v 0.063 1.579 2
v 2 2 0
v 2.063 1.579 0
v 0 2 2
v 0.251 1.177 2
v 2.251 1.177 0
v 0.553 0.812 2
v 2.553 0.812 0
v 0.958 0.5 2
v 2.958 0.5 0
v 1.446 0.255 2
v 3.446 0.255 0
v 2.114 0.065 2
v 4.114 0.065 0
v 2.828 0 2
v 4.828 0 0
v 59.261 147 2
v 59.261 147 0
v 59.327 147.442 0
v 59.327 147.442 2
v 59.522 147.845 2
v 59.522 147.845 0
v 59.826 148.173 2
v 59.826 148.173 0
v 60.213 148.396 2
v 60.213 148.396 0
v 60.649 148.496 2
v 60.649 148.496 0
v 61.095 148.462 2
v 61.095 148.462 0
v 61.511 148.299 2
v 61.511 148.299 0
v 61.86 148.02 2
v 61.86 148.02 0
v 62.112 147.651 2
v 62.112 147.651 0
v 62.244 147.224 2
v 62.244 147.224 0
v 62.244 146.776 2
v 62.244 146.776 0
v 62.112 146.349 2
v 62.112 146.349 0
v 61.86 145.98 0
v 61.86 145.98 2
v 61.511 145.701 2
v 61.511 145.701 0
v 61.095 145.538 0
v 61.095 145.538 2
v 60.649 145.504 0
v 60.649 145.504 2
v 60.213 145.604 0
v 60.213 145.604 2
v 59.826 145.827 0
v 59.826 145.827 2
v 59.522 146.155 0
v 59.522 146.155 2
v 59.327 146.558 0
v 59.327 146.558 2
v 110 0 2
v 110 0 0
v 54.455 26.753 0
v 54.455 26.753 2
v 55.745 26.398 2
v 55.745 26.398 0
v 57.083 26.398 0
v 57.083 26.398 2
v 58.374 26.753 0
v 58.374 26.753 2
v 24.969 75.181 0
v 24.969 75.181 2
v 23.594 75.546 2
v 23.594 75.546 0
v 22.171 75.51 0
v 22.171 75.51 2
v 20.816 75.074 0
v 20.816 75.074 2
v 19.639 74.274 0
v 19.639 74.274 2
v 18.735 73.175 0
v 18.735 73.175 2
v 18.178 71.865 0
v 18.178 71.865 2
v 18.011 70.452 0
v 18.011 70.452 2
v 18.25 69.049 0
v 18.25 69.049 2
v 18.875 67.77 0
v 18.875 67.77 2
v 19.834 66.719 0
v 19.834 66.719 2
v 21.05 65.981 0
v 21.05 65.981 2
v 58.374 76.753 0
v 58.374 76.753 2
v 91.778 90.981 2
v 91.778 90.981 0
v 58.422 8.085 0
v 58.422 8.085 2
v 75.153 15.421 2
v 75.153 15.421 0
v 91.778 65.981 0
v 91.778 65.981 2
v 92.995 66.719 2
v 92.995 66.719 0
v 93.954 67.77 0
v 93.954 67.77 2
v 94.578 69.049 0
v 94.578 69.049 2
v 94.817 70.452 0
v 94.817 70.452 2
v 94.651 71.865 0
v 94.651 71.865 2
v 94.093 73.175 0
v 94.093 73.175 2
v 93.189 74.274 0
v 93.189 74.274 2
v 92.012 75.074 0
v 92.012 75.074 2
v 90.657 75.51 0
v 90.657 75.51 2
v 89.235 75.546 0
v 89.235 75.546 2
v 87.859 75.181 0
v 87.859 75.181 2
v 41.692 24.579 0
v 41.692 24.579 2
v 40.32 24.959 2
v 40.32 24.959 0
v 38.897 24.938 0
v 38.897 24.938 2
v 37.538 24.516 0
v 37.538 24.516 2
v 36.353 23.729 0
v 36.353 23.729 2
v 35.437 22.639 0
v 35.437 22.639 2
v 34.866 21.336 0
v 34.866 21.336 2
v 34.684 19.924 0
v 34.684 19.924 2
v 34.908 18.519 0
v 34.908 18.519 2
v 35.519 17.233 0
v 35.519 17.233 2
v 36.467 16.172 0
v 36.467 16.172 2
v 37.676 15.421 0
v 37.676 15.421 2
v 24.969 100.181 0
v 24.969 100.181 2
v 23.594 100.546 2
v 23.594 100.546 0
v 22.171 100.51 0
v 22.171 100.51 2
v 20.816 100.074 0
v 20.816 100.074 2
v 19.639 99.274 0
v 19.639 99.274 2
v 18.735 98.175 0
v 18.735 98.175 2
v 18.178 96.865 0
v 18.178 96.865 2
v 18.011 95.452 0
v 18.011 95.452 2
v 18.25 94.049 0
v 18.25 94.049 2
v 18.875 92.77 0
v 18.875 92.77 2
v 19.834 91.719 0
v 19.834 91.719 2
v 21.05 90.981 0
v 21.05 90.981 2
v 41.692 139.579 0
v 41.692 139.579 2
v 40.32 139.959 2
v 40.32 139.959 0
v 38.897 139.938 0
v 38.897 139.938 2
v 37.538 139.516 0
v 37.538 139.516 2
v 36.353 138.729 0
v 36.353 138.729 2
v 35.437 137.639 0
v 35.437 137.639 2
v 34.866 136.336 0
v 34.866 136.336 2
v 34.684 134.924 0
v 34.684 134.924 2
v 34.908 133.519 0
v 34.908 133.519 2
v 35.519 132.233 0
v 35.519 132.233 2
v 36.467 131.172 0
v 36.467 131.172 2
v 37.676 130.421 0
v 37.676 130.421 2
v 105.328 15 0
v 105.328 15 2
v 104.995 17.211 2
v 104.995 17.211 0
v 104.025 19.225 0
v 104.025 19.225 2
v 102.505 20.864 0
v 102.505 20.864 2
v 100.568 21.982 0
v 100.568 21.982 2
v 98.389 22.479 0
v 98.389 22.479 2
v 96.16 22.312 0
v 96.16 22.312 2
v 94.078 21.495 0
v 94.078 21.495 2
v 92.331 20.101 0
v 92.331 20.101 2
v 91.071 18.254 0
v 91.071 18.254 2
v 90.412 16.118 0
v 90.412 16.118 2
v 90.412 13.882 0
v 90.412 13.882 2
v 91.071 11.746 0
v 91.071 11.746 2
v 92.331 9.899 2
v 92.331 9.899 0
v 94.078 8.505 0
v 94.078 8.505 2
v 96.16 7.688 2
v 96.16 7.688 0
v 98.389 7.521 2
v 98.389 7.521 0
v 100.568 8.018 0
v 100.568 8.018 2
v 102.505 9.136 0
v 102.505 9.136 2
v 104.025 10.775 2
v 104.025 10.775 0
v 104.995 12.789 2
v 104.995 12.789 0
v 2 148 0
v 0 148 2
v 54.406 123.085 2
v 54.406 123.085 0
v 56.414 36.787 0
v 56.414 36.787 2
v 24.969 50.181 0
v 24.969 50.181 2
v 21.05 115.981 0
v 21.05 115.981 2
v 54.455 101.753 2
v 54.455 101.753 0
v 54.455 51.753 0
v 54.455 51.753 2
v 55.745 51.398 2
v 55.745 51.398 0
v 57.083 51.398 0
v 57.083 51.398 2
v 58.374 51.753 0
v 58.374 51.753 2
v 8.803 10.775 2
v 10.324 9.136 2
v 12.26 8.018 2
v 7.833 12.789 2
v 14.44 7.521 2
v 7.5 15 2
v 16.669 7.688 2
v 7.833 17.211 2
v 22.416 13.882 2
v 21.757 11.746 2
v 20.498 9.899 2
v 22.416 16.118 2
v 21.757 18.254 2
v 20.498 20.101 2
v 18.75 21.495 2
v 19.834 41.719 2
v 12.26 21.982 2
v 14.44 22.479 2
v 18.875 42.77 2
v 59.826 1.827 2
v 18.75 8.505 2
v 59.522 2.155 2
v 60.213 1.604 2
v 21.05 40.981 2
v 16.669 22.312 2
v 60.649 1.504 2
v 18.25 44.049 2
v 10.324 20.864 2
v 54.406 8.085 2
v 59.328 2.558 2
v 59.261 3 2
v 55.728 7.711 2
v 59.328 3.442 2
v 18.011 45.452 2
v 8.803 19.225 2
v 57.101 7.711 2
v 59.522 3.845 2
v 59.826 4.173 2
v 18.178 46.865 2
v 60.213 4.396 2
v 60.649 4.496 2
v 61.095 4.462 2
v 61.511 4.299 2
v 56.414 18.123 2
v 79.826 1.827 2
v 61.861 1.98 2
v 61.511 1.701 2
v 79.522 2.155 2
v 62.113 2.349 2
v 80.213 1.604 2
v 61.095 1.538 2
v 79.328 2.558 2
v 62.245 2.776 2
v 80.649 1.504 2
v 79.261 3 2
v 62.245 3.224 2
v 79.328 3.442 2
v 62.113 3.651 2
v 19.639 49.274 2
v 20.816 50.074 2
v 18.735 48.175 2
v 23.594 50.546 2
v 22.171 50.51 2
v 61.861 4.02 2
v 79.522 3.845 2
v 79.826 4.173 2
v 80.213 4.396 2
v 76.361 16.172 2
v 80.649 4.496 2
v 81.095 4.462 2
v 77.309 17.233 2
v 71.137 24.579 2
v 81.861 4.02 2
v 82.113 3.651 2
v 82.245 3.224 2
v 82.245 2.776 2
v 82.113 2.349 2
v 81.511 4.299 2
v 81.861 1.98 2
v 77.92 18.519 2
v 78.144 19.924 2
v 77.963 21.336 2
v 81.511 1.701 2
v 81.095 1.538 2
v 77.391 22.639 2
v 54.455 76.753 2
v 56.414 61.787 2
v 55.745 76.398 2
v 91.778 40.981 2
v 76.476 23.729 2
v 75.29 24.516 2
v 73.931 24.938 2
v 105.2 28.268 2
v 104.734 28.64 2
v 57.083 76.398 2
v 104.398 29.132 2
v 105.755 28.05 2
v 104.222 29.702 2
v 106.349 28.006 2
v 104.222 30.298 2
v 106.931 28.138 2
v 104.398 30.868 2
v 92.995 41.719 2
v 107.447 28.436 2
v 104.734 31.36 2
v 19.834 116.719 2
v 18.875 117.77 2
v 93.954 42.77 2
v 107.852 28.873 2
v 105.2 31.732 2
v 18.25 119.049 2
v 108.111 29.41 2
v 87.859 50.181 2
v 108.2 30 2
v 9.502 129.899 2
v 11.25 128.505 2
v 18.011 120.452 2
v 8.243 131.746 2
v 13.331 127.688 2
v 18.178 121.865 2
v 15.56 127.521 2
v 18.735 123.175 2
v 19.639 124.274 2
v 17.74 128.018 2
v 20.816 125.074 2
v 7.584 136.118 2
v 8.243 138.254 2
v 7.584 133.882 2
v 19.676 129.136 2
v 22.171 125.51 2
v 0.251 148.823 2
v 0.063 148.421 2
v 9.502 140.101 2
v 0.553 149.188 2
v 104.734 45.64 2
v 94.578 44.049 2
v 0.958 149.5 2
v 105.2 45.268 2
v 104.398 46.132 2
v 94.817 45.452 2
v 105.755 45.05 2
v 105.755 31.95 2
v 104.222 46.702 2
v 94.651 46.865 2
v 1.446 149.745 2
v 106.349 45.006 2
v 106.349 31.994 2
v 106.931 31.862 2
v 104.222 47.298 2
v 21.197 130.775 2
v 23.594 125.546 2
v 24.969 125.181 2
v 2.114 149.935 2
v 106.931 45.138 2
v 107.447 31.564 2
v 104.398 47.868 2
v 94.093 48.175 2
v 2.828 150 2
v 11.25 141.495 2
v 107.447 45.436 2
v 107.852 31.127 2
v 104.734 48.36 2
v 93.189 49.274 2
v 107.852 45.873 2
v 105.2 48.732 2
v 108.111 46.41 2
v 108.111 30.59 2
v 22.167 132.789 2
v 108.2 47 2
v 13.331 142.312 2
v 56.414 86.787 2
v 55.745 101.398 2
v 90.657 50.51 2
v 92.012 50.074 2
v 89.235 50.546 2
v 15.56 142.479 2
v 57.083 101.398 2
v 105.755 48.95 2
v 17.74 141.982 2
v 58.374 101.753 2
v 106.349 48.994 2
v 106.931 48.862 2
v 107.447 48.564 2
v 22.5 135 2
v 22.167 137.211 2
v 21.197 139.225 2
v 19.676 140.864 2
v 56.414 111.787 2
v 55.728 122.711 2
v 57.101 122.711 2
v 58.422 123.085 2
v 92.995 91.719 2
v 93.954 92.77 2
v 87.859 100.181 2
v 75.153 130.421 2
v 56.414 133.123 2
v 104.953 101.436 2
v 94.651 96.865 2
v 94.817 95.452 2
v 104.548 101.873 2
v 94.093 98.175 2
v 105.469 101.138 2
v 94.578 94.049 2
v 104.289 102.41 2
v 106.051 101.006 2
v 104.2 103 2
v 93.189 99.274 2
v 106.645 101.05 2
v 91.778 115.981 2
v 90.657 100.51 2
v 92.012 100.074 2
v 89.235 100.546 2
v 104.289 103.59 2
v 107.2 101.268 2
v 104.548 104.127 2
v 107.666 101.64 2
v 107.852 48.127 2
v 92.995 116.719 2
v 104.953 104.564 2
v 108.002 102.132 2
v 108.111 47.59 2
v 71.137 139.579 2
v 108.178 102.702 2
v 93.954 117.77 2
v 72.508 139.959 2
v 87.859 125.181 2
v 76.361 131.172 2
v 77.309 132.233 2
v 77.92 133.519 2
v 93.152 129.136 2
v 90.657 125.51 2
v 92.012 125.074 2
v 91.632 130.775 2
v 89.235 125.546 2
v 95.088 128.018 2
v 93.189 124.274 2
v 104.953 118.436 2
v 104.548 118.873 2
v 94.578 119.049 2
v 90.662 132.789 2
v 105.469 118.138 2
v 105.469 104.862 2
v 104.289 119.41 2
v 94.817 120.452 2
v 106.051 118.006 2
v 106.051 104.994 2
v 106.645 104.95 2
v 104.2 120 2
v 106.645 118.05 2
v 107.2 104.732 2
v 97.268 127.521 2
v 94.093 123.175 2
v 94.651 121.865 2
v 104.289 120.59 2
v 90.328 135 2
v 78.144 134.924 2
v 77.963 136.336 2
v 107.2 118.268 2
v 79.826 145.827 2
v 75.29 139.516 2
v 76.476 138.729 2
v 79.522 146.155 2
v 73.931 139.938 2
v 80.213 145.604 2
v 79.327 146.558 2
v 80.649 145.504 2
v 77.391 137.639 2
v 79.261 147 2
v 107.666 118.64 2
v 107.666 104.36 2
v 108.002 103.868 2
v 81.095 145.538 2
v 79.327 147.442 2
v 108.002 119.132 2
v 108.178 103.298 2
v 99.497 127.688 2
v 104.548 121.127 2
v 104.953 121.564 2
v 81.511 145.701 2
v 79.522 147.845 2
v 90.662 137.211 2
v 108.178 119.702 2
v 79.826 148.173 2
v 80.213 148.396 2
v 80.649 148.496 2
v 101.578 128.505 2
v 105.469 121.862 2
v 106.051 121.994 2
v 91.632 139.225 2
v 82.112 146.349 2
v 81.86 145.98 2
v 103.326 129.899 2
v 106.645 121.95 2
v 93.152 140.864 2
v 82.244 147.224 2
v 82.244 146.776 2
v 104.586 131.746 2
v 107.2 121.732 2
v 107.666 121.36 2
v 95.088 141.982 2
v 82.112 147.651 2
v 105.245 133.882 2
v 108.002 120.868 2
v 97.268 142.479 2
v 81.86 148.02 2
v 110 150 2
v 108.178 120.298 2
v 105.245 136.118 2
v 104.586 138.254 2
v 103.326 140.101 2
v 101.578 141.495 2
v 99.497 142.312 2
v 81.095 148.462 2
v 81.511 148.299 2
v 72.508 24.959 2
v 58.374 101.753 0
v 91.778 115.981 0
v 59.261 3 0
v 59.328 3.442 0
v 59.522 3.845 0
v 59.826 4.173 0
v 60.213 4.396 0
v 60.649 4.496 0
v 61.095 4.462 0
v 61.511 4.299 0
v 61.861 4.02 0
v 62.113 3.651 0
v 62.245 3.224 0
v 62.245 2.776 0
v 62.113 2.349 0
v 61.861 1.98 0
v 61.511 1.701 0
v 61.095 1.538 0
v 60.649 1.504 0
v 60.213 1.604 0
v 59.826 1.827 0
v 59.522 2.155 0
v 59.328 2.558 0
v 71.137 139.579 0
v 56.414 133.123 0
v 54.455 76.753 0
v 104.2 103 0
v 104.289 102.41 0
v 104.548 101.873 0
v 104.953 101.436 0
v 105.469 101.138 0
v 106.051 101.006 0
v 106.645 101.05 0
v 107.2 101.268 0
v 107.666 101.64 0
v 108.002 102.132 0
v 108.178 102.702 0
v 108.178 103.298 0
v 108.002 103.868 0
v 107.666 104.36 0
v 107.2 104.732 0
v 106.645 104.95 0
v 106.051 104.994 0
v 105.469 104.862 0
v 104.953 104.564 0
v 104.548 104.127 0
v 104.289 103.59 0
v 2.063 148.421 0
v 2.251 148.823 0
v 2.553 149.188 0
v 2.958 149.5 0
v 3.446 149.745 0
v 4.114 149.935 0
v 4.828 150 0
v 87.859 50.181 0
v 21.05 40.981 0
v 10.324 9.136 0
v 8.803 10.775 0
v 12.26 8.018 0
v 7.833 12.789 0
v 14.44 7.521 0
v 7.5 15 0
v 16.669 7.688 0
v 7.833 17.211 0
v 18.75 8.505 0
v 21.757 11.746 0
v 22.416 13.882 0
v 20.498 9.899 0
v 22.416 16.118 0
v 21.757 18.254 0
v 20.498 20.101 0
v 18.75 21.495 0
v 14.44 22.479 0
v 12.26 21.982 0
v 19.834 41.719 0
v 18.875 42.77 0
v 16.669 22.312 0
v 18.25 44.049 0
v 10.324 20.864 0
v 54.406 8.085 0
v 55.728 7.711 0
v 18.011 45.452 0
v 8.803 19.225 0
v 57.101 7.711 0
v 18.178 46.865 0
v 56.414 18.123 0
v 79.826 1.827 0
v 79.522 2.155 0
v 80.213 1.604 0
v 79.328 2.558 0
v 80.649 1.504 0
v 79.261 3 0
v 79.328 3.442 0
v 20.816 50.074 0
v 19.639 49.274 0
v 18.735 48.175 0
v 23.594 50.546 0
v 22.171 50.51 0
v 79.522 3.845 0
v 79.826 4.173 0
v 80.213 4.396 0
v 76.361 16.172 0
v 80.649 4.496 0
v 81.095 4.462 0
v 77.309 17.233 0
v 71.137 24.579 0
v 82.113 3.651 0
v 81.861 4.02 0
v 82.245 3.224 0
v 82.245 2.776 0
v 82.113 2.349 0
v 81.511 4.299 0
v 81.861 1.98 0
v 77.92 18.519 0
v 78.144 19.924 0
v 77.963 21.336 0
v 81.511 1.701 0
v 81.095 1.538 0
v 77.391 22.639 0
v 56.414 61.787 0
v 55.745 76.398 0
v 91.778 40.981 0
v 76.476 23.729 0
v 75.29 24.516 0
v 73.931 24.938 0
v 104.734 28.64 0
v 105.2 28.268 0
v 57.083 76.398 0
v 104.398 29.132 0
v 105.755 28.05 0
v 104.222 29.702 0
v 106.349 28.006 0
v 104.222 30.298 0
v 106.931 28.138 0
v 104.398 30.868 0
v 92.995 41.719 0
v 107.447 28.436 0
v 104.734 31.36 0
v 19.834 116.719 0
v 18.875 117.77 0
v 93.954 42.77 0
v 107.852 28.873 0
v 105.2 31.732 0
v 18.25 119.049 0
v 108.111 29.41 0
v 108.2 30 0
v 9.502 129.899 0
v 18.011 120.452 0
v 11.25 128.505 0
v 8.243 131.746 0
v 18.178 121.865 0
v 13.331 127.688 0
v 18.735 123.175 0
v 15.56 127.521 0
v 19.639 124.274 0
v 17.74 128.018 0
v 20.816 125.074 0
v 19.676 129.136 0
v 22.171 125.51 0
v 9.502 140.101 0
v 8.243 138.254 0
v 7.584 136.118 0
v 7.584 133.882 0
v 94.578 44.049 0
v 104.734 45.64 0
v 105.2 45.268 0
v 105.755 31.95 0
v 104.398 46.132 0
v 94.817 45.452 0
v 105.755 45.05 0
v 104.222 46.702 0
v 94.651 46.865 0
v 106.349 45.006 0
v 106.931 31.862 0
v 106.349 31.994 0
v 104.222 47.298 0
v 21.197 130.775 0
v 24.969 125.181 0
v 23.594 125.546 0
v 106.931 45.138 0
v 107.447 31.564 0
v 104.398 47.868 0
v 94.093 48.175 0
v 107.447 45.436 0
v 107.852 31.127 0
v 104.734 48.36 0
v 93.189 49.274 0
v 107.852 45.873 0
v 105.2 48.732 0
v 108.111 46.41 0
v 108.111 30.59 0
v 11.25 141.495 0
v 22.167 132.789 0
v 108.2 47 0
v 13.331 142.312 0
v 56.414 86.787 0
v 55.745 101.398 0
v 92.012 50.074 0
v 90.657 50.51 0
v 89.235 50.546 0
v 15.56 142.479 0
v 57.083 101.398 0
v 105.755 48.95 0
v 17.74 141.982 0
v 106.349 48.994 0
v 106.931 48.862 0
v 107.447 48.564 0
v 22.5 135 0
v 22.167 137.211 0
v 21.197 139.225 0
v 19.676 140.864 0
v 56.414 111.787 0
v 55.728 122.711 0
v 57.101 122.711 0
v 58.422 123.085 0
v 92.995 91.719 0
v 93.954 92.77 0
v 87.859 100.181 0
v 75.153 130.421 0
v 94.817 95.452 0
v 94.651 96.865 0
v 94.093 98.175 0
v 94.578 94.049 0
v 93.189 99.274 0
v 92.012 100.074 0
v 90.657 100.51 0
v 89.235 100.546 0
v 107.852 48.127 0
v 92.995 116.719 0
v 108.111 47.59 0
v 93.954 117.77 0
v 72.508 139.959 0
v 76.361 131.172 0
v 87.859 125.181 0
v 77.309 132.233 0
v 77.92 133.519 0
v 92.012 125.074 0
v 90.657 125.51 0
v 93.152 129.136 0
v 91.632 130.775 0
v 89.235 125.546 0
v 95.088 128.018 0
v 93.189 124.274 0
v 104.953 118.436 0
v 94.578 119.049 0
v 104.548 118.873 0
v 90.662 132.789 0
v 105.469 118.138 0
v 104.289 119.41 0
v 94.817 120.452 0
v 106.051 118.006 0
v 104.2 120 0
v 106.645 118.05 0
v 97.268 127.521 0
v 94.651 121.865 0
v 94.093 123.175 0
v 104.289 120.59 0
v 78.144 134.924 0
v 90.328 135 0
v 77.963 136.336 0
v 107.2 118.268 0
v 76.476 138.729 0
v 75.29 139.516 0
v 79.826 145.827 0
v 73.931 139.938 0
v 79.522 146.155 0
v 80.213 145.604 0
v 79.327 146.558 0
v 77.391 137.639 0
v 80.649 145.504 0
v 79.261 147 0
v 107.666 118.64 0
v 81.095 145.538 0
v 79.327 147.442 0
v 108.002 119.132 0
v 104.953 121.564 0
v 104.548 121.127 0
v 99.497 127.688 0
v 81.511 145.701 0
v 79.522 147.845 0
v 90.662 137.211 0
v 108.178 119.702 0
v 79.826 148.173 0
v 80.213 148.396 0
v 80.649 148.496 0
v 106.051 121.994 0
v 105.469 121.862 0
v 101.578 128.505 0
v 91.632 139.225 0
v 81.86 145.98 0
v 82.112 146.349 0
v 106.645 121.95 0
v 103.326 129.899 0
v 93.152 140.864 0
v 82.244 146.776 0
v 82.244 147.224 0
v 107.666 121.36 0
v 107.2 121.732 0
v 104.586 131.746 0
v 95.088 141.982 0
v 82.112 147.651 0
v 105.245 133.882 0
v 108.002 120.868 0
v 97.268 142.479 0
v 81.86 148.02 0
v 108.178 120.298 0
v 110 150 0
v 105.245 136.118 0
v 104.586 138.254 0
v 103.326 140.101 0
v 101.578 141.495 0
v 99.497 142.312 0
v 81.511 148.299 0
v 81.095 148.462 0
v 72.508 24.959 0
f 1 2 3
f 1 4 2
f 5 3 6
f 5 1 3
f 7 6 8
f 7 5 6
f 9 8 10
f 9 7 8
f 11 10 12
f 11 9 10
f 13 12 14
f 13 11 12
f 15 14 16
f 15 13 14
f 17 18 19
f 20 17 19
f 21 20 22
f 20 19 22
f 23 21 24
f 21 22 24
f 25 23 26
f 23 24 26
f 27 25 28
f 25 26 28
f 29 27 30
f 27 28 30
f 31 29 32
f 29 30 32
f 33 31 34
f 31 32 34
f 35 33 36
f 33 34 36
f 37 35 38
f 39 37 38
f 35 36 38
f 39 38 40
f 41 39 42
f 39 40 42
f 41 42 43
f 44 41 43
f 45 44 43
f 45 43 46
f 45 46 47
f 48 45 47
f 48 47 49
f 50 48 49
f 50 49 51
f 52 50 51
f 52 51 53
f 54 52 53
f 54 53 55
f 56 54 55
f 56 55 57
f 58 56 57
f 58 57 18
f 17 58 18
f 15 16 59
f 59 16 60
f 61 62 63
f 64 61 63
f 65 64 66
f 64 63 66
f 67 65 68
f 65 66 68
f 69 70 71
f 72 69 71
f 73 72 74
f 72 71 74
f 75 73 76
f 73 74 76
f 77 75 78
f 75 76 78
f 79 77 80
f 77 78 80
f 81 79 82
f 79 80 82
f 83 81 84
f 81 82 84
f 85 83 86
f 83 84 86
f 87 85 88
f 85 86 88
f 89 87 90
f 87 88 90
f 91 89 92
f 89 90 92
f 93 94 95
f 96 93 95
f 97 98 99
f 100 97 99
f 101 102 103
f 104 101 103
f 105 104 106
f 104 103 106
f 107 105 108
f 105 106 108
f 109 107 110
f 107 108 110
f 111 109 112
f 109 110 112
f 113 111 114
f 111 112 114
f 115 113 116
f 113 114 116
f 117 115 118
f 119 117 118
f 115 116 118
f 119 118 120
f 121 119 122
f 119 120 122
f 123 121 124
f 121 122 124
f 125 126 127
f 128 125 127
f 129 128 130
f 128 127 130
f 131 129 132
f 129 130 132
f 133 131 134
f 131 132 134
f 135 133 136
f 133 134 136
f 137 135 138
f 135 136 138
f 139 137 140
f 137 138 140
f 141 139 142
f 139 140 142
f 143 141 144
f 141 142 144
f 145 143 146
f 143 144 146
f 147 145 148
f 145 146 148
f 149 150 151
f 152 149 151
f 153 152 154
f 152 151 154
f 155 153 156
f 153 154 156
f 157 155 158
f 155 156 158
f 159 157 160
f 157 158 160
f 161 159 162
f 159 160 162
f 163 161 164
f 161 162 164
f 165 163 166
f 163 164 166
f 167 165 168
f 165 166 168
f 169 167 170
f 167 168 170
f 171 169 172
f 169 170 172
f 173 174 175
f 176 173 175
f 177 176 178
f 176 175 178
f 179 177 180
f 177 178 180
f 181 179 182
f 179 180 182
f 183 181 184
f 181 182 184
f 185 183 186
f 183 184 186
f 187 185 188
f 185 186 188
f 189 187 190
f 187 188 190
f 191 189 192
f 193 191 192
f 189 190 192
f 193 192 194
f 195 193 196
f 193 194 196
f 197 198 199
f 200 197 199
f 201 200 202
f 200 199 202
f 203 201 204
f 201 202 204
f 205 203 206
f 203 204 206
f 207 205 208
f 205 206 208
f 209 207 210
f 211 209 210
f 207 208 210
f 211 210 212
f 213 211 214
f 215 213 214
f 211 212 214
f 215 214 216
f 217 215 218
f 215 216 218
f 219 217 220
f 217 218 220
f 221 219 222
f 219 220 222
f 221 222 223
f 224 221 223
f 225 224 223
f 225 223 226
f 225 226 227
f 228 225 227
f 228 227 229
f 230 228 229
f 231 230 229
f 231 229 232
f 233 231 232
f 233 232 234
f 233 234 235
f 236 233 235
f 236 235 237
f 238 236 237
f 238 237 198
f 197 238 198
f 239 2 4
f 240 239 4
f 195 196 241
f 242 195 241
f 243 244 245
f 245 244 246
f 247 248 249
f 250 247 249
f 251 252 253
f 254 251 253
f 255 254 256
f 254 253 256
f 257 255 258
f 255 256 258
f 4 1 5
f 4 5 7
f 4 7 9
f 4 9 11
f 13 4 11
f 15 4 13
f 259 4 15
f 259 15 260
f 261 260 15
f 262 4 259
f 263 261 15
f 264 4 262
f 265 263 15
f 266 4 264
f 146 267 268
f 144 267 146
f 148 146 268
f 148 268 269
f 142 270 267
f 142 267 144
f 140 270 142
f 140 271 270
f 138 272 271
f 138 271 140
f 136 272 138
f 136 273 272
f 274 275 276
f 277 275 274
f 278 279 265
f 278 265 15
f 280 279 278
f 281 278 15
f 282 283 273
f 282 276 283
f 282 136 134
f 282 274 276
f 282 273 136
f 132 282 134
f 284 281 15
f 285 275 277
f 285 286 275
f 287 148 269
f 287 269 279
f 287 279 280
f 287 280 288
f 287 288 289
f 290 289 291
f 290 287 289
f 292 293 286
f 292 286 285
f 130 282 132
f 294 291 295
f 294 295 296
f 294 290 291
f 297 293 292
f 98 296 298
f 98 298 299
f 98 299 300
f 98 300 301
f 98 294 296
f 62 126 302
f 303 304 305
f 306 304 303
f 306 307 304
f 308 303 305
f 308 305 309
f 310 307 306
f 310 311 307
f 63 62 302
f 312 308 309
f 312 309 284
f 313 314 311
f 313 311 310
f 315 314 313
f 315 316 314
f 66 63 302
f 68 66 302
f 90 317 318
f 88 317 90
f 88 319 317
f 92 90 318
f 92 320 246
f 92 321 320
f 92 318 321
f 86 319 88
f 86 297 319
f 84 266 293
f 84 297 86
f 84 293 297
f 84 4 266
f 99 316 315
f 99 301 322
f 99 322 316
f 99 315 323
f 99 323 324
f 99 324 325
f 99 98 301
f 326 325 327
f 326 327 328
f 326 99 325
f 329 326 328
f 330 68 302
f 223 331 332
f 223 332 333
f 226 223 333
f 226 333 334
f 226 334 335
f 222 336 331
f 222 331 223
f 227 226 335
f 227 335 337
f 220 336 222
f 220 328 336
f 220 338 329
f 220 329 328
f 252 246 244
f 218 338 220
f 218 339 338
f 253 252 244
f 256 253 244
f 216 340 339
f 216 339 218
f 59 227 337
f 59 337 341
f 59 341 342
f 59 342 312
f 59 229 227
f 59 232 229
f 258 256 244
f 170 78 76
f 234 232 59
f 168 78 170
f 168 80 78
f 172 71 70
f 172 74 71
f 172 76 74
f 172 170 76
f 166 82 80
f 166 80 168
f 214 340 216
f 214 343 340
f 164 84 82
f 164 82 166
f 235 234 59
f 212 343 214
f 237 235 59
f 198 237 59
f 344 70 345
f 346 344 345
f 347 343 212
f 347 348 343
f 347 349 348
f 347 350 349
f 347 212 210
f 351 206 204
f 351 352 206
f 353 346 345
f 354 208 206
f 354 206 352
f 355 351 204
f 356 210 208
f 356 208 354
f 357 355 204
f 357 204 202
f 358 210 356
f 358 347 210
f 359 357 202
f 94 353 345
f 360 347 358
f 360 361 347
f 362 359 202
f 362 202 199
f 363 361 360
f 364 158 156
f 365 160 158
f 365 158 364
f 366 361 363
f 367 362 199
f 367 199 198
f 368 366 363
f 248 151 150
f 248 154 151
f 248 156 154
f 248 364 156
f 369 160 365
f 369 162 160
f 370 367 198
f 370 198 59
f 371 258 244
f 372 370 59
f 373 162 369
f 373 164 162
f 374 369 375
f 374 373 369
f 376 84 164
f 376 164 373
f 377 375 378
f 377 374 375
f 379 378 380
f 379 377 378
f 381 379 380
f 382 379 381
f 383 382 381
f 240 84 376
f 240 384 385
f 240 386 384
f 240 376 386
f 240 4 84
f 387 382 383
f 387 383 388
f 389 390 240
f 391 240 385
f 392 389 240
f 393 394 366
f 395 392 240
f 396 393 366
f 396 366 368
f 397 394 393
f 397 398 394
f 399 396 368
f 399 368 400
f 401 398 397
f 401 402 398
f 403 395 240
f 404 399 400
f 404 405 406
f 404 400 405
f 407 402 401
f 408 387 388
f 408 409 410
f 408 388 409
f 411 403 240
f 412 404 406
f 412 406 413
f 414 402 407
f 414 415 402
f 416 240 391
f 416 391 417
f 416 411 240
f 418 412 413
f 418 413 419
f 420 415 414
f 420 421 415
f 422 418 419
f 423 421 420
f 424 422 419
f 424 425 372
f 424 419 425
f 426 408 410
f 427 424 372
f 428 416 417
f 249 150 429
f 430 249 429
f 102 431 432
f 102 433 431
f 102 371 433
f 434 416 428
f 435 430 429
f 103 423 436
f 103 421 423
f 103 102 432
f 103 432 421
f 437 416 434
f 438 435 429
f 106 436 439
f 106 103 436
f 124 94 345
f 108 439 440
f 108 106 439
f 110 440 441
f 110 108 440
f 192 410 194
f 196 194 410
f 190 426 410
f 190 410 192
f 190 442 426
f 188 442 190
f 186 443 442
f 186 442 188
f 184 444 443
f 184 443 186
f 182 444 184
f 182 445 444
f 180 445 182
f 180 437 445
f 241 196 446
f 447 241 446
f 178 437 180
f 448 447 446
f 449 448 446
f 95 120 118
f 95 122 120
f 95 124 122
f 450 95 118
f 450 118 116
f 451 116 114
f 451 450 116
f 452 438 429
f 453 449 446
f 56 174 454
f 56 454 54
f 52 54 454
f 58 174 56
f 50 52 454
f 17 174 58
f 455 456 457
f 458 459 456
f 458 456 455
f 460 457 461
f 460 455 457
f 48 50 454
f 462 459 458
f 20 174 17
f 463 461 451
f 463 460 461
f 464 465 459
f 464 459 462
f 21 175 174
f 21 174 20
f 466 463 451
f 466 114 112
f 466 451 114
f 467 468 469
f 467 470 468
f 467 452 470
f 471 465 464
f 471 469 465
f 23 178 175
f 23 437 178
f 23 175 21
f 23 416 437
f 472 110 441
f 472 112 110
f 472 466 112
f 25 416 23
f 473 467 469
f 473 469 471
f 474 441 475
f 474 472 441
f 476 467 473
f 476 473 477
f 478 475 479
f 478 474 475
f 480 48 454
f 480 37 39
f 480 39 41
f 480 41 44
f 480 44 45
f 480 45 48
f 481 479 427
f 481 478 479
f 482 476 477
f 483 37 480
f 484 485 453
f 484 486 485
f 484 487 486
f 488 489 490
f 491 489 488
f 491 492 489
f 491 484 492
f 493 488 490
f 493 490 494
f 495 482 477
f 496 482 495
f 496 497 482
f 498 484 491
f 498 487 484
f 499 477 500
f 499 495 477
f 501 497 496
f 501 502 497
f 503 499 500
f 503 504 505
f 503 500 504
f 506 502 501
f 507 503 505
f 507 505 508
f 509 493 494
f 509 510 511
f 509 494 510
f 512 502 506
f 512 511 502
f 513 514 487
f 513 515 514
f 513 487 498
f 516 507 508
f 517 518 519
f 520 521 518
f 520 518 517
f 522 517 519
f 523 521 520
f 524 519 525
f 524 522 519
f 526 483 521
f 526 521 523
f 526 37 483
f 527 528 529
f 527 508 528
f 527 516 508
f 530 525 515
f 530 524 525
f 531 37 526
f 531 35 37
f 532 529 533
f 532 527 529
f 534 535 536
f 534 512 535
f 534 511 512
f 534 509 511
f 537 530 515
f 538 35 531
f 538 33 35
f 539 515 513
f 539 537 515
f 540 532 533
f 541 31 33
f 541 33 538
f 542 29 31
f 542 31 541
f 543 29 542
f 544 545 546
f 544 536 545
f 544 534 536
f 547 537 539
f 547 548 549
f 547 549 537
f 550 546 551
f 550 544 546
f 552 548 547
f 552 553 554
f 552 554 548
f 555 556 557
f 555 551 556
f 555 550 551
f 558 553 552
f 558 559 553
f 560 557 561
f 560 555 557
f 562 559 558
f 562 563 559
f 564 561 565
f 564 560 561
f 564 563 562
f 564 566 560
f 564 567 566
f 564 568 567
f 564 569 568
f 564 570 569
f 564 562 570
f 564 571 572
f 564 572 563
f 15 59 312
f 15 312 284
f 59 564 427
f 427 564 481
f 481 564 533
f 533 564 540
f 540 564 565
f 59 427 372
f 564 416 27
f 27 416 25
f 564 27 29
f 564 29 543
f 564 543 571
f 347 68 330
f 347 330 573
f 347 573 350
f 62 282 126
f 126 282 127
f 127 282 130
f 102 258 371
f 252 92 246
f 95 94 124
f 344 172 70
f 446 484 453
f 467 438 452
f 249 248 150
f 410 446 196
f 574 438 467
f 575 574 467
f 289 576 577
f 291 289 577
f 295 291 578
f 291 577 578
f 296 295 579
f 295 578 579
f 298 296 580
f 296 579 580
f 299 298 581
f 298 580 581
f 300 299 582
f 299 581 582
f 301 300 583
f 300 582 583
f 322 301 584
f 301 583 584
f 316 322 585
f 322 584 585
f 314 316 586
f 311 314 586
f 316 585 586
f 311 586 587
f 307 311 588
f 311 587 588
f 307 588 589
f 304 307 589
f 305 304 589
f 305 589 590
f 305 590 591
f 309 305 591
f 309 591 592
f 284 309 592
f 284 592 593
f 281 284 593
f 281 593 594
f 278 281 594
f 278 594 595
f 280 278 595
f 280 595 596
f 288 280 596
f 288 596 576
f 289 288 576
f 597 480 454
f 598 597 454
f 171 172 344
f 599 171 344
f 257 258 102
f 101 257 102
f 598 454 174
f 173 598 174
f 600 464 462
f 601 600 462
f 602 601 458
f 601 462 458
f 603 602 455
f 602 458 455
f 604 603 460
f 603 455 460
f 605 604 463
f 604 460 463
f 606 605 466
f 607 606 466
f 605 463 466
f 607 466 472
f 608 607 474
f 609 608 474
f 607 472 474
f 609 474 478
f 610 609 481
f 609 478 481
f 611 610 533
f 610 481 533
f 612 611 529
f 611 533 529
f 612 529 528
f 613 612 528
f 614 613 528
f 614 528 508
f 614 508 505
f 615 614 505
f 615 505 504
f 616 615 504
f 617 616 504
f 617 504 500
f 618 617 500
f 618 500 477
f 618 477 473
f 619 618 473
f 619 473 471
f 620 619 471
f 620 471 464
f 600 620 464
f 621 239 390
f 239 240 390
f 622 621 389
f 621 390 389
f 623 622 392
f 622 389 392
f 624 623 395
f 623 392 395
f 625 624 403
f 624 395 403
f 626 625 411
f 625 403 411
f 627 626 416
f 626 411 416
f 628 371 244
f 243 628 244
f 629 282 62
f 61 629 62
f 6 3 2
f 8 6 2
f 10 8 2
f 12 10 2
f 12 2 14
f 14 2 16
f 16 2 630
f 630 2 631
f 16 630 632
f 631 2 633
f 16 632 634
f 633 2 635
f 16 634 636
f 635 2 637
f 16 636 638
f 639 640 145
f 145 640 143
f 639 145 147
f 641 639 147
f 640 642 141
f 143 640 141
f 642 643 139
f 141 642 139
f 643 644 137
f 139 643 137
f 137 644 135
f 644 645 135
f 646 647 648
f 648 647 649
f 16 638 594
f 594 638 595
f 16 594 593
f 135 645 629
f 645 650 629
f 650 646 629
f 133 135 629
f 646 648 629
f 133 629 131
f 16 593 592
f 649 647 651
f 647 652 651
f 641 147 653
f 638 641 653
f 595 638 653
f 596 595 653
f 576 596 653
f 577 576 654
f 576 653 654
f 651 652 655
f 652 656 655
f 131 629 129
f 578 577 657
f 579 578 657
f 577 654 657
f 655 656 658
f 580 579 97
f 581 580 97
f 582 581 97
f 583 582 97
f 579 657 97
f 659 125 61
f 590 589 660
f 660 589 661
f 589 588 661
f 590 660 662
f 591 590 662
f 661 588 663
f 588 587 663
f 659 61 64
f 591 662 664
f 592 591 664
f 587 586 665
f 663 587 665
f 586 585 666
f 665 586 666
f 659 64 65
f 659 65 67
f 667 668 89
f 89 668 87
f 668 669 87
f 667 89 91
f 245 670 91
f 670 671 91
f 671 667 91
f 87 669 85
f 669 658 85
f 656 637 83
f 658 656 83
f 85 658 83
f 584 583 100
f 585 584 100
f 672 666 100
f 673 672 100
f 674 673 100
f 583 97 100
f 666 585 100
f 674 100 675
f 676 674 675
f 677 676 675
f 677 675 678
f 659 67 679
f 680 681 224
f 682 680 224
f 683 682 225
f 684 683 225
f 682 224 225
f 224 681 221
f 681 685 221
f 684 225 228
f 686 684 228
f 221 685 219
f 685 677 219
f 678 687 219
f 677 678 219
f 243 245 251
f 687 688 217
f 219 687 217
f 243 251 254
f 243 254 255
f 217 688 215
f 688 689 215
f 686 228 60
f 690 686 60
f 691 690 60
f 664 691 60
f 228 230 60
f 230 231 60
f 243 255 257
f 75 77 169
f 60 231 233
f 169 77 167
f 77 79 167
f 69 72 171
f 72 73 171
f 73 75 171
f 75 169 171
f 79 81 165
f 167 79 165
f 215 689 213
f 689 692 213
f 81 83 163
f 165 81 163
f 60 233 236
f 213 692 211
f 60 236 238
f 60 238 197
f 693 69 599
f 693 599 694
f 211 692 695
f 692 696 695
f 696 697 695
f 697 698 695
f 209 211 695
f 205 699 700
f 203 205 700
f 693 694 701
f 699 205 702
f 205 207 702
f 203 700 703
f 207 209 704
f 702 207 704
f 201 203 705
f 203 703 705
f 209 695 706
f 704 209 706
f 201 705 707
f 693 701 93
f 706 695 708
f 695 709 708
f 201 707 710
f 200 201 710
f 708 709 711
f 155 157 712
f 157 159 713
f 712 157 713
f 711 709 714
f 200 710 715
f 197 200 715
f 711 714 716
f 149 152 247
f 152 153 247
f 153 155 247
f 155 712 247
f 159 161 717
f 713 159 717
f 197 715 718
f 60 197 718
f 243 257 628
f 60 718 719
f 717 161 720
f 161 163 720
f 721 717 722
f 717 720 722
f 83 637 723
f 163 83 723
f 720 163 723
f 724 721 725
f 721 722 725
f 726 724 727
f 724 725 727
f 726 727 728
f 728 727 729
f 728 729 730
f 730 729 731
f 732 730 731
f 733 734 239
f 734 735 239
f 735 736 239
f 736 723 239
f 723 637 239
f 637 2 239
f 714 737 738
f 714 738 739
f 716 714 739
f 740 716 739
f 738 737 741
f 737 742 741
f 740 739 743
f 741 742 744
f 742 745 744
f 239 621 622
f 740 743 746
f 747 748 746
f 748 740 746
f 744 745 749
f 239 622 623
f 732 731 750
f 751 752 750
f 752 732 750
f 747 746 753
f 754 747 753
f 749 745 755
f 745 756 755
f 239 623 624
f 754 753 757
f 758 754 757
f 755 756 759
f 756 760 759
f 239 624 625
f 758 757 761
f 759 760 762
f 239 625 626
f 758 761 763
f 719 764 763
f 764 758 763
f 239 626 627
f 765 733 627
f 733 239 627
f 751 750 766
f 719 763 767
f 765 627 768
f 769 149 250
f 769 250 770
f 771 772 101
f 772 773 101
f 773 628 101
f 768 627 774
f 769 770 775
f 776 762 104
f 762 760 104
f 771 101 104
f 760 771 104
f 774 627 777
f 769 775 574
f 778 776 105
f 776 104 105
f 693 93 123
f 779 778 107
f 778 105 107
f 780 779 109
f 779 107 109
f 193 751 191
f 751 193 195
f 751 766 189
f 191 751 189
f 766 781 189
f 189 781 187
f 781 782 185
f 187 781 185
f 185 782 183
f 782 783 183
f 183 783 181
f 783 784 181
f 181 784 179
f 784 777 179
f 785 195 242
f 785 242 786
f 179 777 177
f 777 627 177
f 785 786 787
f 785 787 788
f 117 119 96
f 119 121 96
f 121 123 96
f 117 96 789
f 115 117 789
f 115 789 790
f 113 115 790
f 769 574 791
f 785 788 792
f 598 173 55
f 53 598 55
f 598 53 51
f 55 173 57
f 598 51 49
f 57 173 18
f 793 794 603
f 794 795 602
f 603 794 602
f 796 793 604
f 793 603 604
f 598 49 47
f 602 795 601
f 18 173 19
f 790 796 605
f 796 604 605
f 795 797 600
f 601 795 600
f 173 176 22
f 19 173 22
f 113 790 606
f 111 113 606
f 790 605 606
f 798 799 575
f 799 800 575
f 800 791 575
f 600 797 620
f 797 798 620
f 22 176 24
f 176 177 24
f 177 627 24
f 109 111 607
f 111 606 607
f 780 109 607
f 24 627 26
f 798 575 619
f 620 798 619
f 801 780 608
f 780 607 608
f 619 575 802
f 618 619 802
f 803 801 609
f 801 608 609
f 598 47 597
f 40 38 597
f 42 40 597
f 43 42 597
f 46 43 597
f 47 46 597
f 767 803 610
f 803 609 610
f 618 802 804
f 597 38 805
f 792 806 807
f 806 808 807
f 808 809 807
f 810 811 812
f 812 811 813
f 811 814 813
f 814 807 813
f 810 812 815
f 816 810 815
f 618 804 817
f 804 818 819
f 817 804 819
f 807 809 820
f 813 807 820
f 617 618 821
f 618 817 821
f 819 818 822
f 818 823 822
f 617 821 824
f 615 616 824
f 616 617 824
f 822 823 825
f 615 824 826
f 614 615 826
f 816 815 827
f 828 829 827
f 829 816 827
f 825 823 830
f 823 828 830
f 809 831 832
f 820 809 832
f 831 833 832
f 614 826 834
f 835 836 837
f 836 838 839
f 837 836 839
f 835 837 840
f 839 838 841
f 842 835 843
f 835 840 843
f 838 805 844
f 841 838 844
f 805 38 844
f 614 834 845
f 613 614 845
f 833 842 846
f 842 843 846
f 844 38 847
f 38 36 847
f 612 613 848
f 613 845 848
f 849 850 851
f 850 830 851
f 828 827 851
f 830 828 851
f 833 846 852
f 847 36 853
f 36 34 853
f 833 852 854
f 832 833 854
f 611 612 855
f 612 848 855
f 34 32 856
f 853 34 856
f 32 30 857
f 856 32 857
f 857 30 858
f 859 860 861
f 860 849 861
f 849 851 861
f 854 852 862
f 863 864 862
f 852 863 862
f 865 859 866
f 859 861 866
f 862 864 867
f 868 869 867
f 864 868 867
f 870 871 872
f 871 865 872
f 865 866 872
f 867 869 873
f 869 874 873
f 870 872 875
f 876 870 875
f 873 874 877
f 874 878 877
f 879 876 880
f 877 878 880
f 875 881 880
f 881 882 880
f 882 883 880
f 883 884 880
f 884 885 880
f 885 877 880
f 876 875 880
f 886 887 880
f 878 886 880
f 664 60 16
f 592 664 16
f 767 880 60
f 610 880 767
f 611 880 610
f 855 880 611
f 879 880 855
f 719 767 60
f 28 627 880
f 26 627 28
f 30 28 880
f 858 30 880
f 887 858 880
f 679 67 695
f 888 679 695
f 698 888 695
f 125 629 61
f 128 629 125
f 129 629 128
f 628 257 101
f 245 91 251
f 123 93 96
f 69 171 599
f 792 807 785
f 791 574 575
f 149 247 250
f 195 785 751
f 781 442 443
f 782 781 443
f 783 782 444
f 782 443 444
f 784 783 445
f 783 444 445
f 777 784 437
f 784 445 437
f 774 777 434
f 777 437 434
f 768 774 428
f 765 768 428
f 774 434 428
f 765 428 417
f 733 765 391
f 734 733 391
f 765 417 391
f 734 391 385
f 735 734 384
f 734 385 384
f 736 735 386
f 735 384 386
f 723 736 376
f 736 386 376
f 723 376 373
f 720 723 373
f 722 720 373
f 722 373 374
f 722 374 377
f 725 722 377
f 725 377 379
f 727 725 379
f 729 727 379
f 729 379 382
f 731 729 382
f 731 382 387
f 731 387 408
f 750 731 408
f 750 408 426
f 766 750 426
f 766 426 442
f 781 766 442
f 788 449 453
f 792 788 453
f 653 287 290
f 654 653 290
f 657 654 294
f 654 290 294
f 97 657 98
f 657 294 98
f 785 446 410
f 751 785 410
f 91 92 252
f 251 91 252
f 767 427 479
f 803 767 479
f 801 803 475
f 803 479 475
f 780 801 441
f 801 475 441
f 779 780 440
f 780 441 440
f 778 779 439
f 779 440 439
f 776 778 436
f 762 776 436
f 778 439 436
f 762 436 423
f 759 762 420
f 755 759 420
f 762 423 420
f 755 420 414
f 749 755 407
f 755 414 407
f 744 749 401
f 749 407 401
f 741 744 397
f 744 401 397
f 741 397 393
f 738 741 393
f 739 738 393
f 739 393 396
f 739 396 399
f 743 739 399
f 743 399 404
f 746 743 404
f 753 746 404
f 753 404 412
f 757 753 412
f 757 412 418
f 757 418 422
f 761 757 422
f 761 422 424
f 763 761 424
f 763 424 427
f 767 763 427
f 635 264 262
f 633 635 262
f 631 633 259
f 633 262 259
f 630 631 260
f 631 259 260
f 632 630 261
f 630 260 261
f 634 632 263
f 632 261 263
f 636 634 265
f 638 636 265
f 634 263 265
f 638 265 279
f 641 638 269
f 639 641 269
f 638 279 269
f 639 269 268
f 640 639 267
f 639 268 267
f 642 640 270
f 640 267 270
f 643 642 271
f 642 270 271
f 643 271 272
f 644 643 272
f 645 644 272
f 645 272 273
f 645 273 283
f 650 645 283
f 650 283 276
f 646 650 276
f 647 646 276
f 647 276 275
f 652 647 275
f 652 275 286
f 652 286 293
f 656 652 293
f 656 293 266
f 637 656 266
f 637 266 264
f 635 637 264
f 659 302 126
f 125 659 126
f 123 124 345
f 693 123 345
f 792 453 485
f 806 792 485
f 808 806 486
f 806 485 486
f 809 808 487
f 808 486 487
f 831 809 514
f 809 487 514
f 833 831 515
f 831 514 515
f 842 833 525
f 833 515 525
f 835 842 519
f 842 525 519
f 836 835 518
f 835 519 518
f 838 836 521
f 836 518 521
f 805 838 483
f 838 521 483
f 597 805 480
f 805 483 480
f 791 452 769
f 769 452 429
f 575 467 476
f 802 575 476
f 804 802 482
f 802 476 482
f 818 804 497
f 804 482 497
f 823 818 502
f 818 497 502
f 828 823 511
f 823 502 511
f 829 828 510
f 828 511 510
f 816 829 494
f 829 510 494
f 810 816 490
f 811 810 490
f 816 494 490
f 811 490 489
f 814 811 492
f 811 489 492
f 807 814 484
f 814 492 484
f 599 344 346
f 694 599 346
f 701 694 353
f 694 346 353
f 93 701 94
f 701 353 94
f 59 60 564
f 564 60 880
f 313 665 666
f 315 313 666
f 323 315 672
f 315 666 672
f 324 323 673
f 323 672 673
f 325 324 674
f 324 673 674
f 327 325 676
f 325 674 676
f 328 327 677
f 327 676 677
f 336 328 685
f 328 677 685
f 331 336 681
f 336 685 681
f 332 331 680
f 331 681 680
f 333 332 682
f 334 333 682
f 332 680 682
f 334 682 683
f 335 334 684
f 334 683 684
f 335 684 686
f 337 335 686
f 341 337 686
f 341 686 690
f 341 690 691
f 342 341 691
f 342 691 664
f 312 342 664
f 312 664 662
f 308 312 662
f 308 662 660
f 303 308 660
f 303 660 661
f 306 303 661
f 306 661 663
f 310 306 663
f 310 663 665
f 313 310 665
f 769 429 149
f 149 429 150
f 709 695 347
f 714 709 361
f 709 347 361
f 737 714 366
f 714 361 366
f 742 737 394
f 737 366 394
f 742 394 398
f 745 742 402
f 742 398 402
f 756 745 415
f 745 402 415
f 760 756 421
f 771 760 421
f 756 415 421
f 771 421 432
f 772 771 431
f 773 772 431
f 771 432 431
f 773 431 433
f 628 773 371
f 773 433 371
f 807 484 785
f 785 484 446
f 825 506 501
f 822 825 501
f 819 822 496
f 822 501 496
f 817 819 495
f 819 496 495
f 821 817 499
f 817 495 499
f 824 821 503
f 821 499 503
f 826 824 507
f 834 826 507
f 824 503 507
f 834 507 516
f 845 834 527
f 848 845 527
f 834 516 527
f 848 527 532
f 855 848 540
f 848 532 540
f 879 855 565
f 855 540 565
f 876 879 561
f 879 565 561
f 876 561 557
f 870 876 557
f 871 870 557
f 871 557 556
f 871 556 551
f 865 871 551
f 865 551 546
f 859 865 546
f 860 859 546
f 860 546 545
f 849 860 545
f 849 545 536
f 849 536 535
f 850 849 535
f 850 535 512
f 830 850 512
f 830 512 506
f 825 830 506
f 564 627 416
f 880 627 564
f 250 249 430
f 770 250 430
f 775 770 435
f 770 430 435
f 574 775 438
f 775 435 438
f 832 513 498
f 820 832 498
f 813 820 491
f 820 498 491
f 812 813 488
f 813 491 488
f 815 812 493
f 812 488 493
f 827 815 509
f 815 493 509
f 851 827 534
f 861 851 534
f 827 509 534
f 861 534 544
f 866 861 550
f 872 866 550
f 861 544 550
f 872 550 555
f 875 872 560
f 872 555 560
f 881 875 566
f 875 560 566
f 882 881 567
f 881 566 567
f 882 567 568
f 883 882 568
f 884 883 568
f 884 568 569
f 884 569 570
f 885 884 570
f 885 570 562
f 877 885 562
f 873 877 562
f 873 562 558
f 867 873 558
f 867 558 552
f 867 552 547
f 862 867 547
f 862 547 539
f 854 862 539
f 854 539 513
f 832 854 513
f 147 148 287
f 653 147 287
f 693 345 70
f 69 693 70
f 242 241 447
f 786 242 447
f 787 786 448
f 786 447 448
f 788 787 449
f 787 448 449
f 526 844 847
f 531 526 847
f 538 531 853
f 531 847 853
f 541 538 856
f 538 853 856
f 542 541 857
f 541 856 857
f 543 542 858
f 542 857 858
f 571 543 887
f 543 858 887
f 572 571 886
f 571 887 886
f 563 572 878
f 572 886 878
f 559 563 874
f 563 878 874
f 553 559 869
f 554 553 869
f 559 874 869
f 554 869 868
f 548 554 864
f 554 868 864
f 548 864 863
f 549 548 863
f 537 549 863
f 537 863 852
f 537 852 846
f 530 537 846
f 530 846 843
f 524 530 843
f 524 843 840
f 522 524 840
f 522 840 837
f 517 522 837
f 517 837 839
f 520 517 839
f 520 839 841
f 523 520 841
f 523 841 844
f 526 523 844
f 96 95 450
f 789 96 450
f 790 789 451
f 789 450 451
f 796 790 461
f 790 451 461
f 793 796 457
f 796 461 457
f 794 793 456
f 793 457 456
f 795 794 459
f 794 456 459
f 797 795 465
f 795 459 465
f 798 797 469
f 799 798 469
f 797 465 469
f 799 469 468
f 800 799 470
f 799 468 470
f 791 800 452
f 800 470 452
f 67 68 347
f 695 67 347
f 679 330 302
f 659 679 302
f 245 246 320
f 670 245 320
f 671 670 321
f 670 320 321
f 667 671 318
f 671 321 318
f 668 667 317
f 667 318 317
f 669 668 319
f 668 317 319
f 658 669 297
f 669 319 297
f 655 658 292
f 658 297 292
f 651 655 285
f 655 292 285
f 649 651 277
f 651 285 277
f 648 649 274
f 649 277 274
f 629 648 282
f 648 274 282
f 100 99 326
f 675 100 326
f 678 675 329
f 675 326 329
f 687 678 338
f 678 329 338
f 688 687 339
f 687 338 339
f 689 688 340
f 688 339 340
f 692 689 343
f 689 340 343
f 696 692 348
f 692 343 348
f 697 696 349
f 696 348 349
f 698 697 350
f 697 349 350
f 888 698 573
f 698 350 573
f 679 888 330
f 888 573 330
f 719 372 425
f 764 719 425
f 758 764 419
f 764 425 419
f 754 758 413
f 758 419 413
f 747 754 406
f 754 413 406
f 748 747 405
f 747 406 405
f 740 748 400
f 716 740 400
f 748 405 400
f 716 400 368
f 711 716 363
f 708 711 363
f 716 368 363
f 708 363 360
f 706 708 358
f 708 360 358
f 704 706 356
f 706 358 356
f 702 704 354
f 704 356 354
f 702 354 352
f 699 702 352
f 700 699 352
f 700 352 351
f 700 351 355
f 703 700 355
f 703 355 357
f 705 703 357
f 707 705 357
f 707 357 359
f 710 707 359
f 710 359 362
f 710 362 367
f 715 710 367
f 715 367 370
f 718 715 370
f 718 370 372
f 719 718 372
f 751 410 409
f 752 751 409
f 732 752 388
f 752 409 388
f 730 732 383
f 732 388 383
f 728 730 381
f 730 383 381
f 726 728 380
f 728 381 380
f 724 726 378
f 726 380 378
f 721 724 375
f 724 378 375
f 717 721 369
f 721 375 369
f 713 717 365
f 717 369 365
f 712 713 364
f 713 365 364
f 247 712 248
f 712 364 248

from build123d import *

# Parameters (mm, degrees)
SKETCH_1_W          = 110
SKETCH_1_H          = 150
EXTRUDE_1_DEPTH     = 2
CUT_EXTRUDE_1_DEPTH = 187.021504133
FILLET_1_R          = 2
FILLET_2_R          = 2
SKETCH_3_R          = 2
CUT_EXTRUDE_2_DEPTH = 187.021504133
SKETCH_4_R          = 1.5
CUT_EXTRUDE_3_DEPTH = 187.021504133
SKETCH_5_R          = 1.5
CUT_EXTRUDE_4_DEPTH = 187.021504133
SKETCH_6_R          = 7.5
CUT_EXTRUDE_6_DEPTH = 10
CUT_EXTRUDE_7_DEPTH = 10


with BuildPart() as part:
    # 草图1 → 凸台-拉伸1 (new body)
    with BuildSketch(Plane.XY):
        with Locations((55, 75)):
            Rectangle(SKETCH_1_W, SKETCH_1_H)
    extrude(amount=EXTRUDE_1_DEPTH)

    # 草图2 → 切除-拉伸1 (cut, through all)
    with BuildSketch(Plane(origin=(0, 150, 0), x_dir=(1, 0, 0), z_dir=(0, 1, 0))):
        Polygon((0, -2), (0, 0), (2, 0), align=None)
    extrude(amount=-CUT_EXTRUDE_1_DEPTH, mode=Mode.SUBTRACT)

    # 圆角1
    fillet_1_edges = [part.edges().sort_by_distance(p)[0] for p in [
        (1, 150, 1),
    ]]
    fillet(fillet_1_edges, radius=FILLET_1_R)

    # 圆角2
    fillet_2_edges = [part.edges().sort_by_distance(p)[0] for p in [
        (1, 0, 1),
    ]]
    fillet(fillet_2_edges, radius=FILLET_2_R)

    # 草图3 → 切除-拉伸2 (cut, through all)
    with BuildSketch(Plane.XY.offset(2)):
        with Locations((106.2, 47)):
            Circle(SKETCH_3_R)
        with Locations((106.2, 30)):
            Circle(SKETCH_3_R)
        with Locations(Location((106.2, 120, 0), (0, 0, 180))):
            Circle(SKETCH_3_R)
        with Locations(Location((106.2, 103, 0), (0, 0, 180))):
            Circle(SKETCH_3_R)
    extrude(amount=-CUT_EXTRUDE_2_DEPTH, mode=Mode.SUBTRACT)

    # 草图4 → 切除-拉伸3 (cut, through all)
    with BuildSketch(Plane(origin=(0, 0, 0), x_dir=(-1, 0, 0), z_dir=(0, 0, -1))):
        with Locations((-60.760859098, 147)):
            Circle(SKETCH_4_R)
        with Locations((-80.760859098, 147)):
            Circle(SKETCH_4_R)
    extrude(amount=-CUT_EXTRUDE_3_DEPTH, mode=Mode.SUBTRACT)

    # 草图5 → 切除-拉伸4 (cut, through all)
    with BuildSketch(Plane(origin=(0, 0, 0), x_dir=(-1, 0, 0), z_dir=(0, 0, -1))):
        with Locations((-80.76127274, 3)):
            Circle(SKETCH_5_R)
        with Locations((-60.76127274, 3)):
            Circle(SKETCH_5_R)
    extrude(amount=-CUT_EXTRUDE_4_DEPTH, mode=Mode.SUBTRACT)

    # 草图6 → 切除-拉伸6 (cut)
    with BuildSketch(Plane.XY.offset(2)):
        with Locations((15, 135)):
            Circle(SKETCH_6_R)
        with Locations(Location((15, 15, 0), (0, 0, 180))):
            Circle(SKETCH_6_R)
        with Locations((97.828427125, 15)):
            Circle(SKETCH_6_R)
        with Locations(Location((97.828427125, 135, 0), (0, 0, 180))):
            Circle(SKETCH_6_R)
    extrude(amount=-CUT_EXTRUDE_6_DEPTH, mode=Mode.SUBTRACT)

    # 草图7 → 切除-拉伸7 (cut)
    with BuildSketch(Plane.XY.offset(2)):
        with BuildLine():
            Line((56.414213562, 133.123376127), (41.691712888, 139.579112703))
            ThreePointArc((41.691712888, 139.579112703), (35.104684138, 137.007916048), (37.675880793, 130.420887297))
            Line((37.675880793, 130.420887297), (54.406297515, 123.08469044))
            ThreePointArc((54.406297515, 123.08469044), (51.414213562, 127.663803143), (54.406297515, 132.242915846))
            Line((54.406297515, 132.242915846), (56.414213562, 133.123376127))
        make_face()
        with BuildLine():
            Line((58.42212961, 132.242915846), (56.414213562, 133.123376127))
            Line((56.414213562, 133.123376127), (54.406297515, 132.242915846))
            ThreePointArc((54.406297515, 132.242915846), (51.414213562, 127.663803143), (54.406297515, 123.08469044))
            ThreePointArc((54.406297515, 123.08469044), (56.414213562, 122.663803143), (58.42212961, 123.08469044))
            ThreePointArc((58.42212961, 123.08469044), (61.414213562, 127.663803143), (58.42212961, 132.242915846))
        make_face()
        with BuildLine():
            Line((71.136714237, 139.579112703), (56.414213562, 133.123376127))
            Line((56.414213562, 133.123376127), (58.42212961, 132.242915846))
            ThreePointArc((58.42212961, 132.242915846), (61.414213562, 127.663803143), (58.42212961, 123.08469044))
            Line((58.42212961, 123.08469044), (75.152546332, 130.420887297))
            ThreePointArc((75.152546332, 130.420887297), (77.723742987, 137.007916048), (71.136714237, 139.579112703))
        make_face()
        with BuildLine():
            Line((87.859311366, 125.180806839), (56.414213562, 111.787459321))
            Line((56.414213562, 111.787459321), (58.373531952, 110.952930765))
            ThreePointArc((58.373531952, 110.952930765), (61.414213562, 106.352814304), (58.373531952, 101.752697844))
            Line((58.373531952, 101.752697844), (91.777948145, 115.980573918))
            ThreePointArc((91.777948145, 115.980573918), (94.418746216, 122.540008767), (87.859311366, 125.180806839))
        make_face()
        with BuildLine():
            Line((58.373531952, 110.952930765), (56.414213562, 111.787459321))
            Line((56.414213562, 111.787459321), (54.454895173, 110.952930765))
            ThreePointArc((54.454895173, 110.952930765), (51.414213562, 106.352814304), (54.454895173, 101.752697844))
            ThreePointArc((54.454895173, 101.752697844), (56.414213562, 101.352814304), (58.373531952, 101.752697844))
            ThreePointArc((58.373531952, 101.752697844), (61.414213562, 106.352814304), (58.373531952, 110.952930765))
        make_face()
        with BuildLine():
            Line((56.414213562, 111.787459321), (24.969115758, 125.180806839))
            ThreePointArc((24.969115758, 125.180806839), (18.409680909, 122.540008767), (21.05047898, 115.980573918))
            Line((21.05047898, 115.980573918), (54.454895173, 101.752697844))
            ThreePointArc((54.454895173, 101.752697844), (51.414213562, 106.352814304), (54.454895173, 110.952930765))
            Line((54.454895173, 110.952930765), (56.414213562, 111.787459321))
        make_face()
        with BuildLine():
            ThreePointArc((24.969115758, 100.180806839), (18.409680909, 97.540008767), (21.05047898, 90.980573918))
            Line((21.05047898, 90.980573918), (54.454895173, 76.752697844))
            ThreePointArc((54.454895173, 76.752697844), (51.414213562, 81.352814304), (54.454895173, 85.952930765))
            Line((54.454895173, 85.952930765), (56.414213562, 86.787459321))
            Line((56.414213562, 86.787459321), (24.969115758, 100.180806839))
        make_face()
        with BuildLine():
            ThreePointArc((54.454895173, 85.952930765), (51.414213562, 81.352814304), (54.454895173, 76.752697844))
            ThreePointArc((54.454895173, 76.752697844), (56.414213562, 76.352814304), (58.373531952, 76.752697844))
            ThreePointArc((58.373531952, 76.752697844), (61.414213562, 81.352814304), (58.373531952, 85.952930765))
            Line((58.373531952, 85.952930765), (56.414213562, 86.787459321))
            Line((56.414213562, 86.787459321), (54.454895173, 85.952930765))
        make_face()
        with BuildLine():
            ThreePointArc((58.373531952, 85.952930765), (61.414213562, 81.352814304), (58.373531952, 76.752697844))
            Line((58.373531952, 76.752697844), (91.777948145, 90.980573918))
            ThreePointArc((91.777948145, 90.980573918), (94.418746216, 97.540008767), (87.859311366, 100.180806839))
            Line((87.859311366, 100.180806839), (56.414213562, 86.787459321))
            Line((56.414213562, 86.787459321), (58.373531952, 85.952930765))
        make_face()
        with BuildLine():
            ThreePointArc((58.373531952, 60.952930765), (61.414213562, 56.352814304), (58.373531952, 51.752697844))
            Line((58.373531952, 51.752697844), (91.777948145, 65.980573918))
            ThreePointArc((91.777948145, 65.980573918), (94.418746216, 72.540008767), (87.859311366, 75.180806839))
            Line((87.859311366, 75.180806839), (56.414213562, 61.787459321))
            Line((56.414213562, 61.787459321), (58.373531952, 60.952930765))
        make_face()
        with BuildLine():
            ThreePointArc((54.454895173, 60.952930765), (51.414213562, 56.352814304), (54.454895173, 51.752697844))
            ThreePointArc((54.454895173, 51.752697844), (56.414213562, 51.352814304), (58.373531952, 51.752697844))
            ThreePointArc((58.373531952, 51.752697844), (61.414213562, 56.352814304), (58.373531952, 60.952930765))
            Line((58.373531952, 60.952930765), (56.414213562, 61.787459321))
            Line((56.414213562, 61.787459321), (54.454895173, 60.952930765))
        make_face()
        with BuildLine():
            ThreePointArc((24.969115758, 75.180806839), (18.409680909, 72.540008767), (21.05047898, 65.980573918))
            Line((21.05047898, 65.980573918), (54.454895173, 51.752697844))
            ThreePointArc((54.454895173, 51.752697844), (51.414213562, 56.352814304), (54.454895173, 60.952930765))
            Line((54.454895173, 60.952930765), (56.414213562, 61.787459321))
            Line((56.414213562, 61.787459321), (24.969115758, 75.180806839))
        make_face()
        with BuildLine():
            ThreePointArc((24.969115758, 50.180806839), (18.409680909, 47.540008767), (21.05047898, 40.980573918))
            Line((21.05047898, 40.980573918), (54.454895173, 26.752697844))
            ThreePointArc((54.454895173, 26.752697844), (51.414213562, 31.352814304), (54.454895173, 35.952930765))
            Line((54.454895173, 35.952930765), (56.414213562, 36.787459321))
            Line((56.414213562, 36.787459321), (24.969115758, 50.180806839))
        make_face()
        with BuildLine():
            ThreePointArc((54.454895173, 35.952930765), (51.414213562, 31.352814304), (54.454895173, 26.752697844))
            ThreePointArc((54.454895173, 26.752697844), (56.414213562, 26.352814304), (58.373531952, 26.752697844))
            ThreePointArc((58.373531952, 26.752697844), (61.414213562, 31.352814304), (58.373531952, 35.952930765))
            Line((58.373531952, 35.952930765), (56.414213562, 36.787459321))
            Line((56.414213562, 36.787459321), (54.454895173, 35.952930765))
        make_face()
        with BuildLine():
            ThreePointArc((58.373531952, 35.952930765), (61.414213562, 31.352814304), (58.373531952, 26.752697844))
            Line((58.373531952, 26.752697844), (91.777948145, 40.980573918))
            ThreePointArc((91.777948145, 40.980573918), (94.418746216, 47.540008767), (87.859311366, 50.180806839))
            Line((87.859311366, 50.180806839), (56.414213562, 36.787459321))
            Line((56.414213562, 36.787459321), (58.373531952, 35.952930765))
        make_face()
        with BuildLine():
            ThreePointArc((58.42212961, 17.242915846), (61.414213562, 12.663803143), (58.42212961, 8.08469044))
            Line((58.42212961, 8.08469044), (75.152546332, 15.420887297))
            ThreePointArc((75.152546332, 15.420887297), (77.723742987, 22.007916048), (71.136714237, 24.579112703))
            Line((71.136714237, 24.579112703), (56.414213562, 18.123376127))
            Line((56.414213562, 18.123376127), (58.42212961, 17.242915846))
        make_face()
        with BuildLine():
            ThreePointArc((54.406297515, 17.242915846), (51.414213562, 12.663803143), (54.406297515, 8.08469044))
            ThreePointArc((54.406297515, 8.08469044), (56.414213562, 7.663803143), (58.42212961, 8.08469044))
            ThreePointArc((58.42212961, 8.08469044), (61.414213562, 12.663803143), (58.42212961, 17.242915846))
            Line((58.42212961, 17.242915846), (56.414213562, 18.123376127))
            Line((56.414213562, 18.123376127), (54.406297515, 17.242915846))
        make_face()
        with BuildLine():
            ThreePointArc((41.691712888, 24.579112703), (35.104684138, 22.007916048), (37.675880793, 15.420887297))
            Line((37.675880793, 15.420887297), (54.406297515, 8.08469044))
            ThreePointArc((54.406297515, 8.08469044), (51.414213562, 12.663803143), (54.406297515, 17.242915846))
            Line((54.406297515, 17.242915846), (56.414213562, 18.123376127))
            Line((56.414213562, 18.123376127), (41.691712888, 24.579112703))
        make_face()
    extrude(amount=-CUT_EXTRUDE_7_DEPTH, mode=Mode.SUBTRACT)


solid = part.part
